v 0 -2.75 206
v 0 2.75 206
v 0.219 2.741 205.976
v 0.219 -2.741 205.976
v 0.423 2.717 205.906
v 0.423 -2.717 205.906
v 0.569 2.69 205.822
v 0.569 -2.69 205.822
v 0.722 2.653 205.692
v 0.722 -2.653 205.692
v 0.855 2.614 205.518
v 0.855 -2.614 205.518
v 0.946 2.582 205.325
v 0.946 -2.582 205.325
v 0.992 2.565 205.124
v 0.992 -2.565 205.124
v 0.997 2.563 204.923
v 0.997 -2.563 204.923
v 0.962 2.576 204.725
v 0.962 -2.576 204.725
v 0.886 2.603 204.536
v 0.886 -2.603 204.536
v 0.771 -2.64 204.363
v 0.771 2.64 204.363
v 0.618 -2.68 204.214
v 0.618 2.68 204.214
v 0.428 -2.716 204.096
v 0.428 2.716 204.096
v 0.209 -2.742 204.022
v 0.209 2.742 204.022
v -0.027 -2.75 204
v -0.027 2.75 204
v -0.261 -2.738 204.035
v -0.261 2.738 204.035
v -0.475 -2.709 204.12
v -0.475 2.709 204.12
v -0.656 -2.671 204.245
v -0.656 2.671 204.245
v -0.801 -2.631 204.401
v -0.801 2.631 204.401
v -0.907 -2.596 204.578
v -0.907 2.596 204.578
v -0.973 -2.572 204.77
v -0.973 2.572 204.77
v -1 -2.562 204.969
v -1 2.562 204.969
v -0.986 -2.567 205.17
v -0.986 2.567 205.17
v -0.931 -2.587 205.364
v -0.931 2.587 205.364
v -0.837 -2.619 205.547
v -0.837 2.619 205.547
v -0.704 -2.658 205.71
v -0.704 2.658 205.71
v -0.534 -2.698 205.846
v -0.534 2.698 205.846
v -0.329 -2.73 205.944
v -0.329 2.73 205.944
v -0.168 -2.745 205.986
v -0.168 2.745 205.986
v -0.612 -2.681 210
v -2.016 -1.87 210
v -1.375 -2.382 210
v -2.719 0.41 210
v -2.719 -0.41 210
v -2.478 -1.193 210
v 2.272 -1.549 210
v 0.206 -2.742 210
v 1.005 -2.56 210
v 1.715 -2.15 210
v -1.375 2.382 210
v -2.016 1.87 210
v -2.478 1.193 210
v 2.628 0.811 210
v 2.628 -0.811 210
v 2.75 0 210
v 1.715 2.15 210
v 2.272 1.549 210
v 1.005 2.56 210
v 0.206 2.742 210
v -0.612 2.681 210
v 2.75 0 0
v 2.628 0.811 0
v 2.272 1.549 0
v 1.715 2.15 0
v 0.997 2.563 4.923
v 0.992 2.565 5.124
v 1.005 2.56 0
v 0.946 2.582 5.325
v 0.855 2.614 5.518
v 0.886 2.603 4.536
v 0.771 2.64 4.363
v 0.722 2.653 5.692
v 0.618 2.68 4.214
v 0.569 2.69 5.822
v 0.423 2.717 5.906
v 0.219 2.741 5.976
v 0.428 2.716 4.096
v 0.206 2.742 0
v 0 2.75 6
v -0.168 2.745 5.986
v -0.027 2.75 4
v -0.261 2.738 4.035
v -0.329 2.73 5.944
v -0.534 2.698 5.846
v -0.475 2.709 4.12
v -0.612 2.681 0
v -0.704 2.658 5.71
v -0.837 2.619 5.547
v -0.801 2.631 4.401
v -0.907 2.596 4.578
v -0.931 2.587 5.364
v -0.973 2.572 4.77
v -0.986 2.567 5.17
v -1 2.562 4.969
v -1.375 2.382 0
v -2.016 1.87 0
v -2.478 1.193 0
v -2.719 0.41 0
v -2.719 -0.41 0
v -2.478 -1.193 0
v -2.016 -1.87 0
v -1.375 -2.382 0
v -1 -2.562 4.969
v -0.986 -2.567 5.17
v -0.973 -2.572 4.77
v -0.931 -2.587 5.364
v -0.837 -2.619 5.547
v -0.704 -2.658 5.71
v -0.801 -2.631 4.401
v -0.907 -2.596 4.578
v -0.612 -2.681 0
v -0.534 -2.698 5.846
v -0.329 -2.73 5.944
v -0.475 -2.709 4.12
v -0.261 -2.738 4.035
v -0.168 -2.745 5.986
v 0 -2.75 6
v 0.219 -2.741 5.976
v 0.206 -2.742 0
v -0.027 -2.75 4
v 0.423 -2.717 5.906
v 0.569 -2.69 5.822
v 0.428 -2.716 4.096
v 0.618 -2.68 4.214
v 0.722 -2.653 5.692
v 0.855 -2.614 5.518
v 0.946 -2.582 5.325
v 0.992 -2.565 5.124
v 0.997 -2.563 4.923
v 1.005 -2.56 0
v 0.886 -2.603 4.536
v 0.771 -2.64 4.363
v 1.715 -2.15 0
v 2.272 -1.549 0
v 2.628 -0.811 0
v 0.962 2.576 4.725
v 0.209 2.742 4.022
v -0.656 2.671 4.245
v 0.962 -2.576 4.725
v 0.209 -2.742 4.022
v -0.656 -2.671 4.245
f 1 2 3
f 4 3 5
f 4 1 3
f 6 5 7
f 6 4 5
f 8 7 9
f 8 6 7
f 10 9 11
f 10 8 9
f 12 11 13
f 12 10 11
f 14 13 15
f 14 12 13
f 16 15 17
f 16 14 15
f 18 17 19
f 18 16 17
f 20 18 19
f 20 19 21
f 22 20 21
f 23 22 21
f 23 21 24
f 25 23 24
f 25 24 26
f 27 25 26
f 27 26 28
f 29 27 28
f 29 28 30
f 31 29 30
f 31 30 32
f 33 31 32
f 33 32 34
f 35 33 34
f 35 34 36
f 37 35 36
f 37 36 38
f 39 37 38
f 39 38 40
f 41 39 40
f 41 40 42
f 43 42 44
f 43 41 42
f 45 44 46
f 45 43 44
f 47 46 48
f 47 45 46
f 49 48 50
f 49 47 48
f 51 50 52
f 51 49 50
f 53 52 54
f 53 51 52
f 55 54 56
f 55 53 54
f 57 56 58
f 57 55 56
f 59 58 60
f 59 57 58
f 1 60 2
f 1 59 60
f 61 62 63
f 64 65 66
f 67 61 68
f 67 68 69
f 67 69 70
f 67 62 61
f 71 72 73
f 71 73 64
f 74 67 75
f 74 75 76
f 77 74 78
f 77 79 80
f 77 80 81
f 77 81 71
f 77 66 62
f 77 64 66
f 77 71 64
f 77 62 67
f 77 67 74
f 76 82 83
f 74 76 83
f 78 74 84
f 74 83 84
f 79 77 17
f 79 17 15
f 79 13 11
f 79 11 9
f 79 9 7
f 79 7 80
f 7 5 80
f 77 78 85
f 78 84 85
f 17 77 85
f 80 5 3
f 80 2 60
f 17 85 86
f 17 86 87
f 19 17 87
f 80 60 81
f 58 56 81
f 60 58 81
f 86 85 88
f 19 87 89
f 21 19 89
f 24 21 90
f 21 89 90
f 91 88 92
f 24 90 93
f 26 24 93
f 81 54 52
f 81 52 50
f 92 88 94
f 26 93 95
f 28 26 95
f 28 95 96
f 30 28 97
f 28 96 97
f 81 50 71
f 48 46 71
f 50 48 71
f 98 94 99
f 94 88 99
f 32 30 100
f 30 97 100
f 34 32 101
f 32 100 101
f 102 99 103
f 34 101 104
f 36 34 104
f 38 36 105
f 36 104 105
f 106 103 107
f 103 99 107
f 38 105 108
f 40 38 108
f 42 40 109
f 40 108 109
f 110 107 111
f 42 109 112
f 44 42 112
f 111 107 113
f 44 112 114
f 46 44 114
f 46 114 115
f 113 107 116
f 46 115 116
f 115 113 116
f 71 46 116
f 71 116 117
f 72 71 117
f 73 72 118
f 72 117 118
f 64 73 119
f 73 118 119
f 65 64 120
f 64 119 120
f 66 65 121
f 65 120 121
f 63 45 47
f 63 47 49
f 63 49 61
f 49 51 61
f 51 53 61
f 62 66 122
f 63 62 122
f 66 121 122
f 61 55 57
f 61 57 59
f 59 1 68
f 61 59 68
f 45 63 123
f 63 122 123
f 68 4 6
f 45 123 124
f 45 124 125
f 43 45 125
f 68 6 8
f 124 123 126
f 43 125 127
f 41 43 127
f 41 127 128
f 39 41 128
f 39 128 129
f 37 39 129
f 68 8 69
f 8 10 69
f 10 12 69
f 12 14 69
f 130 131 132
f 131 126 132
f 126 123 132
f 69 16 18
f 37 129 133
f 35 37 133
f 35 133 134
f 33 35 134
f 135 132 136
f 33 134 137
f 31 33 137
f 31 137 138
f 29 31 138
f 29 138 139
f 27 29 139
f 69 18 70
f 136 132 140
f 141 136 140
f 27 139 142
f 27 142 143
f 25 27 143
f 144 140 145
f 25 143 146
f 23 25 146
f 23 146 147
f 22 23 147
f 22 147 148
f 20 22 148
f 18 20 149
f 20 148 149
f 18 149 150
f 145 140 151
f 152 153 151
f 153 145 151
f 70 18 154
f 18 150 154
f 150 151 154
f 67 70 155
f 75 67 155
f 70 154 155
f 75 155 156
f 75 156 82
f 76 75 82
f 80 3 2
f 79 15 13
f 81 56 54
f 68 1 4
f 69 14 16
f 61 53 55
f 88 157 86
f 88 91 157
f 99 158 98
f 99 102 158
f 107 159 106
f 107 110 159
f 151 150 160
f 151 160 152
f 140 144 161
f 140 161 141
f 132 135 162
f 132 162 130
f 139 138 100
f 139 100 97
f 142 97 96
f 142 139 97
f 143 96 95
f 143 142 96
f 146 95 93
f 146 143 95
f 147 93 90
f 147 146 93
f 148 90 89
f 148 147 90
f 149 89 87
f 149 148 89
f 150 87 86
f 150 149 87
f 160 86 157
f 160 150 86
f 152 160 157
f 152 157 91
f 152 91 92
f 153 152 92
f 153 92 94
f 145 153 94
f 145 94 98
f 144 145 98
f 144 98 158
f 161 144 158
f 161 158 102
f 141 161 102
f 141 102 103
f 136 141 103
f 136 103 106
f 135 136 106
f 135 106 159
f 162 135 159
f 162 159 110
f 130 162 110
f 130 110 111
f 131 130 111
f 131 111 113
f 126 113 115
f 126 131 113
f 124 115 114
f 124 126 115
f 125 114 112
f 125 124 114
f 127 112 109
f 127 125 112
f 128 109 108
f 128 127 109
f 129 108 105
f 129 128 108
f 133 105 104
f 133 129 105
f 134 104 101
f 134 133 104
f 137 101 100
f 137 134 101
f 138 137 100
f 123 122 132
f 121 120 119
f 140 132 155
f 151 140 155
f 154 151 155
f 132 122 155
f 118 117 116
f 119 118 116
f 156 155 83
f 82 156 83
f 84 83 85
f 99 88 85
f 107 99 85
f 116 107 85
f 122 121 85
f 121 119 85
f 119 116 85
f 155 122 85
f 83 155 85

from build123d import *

# Parameters (mm, degrees)
SKETCH1_R               = 2.75
BOSS_EXTRUDE1_DEPTH     = 210
CUT_EXTRUDE1_DEPTH      = 211.036008818
CUT_EXTRUDE1_DEPTH_BACK = 211.036008818
SKETCH2_R               = 1
CUT_EXTRUDE2_DEPTH      = 211.03600892
CUT_EXTRUDE2_DEPTH_BACK = 211.03600892
SKETCH3_R               = 1


with BuildPart() as part:
    # Sketch1 → Boss-Extrude1 (new body)
    with BuildSketch(Plane.XY):
        Circle(SKETCH1_R)
    extrude(amount=BOSS_EXTRUDE1_DEPTH)

    # Sketch2 → Cut-Extrude1 (cut, two sides: drawn at the far end of the back side and taken through both)
    with BuildSketch(Plane(origin=(0, 0, 0), x_dir=(1, 0, 0), z_dir=(0, 1, 0)).offset(-CUT_EXTRUDE1_DEPTH_BACK)):
        with Locations(Location((0, -5, 0), (0, 0, 270))):
            Circle(SKETCH2_R)
    extrude(amount=CUT_EXTRUDE1_DEPTH + CUT_EXTRUDE1_DEPTH_BACK, mode=Mode.SUBTRACT)

    # Sketch3 → Cut-Extrude2 (cut, two sides: drawn at the far end of the back side and taken through both)
    with BuildSketch(Plane(origin=(0, 0, 0), x_dir=(1, 0, 0), z_dir=(0, 1, 0)).offset(-CUT_EXTRUDE2_DEPTH_BACK)):
        with Locations(Location((0, -205, 0), (0, 0, 270))):
            Circle(SKETCH3_R)
    extrude(amount=CUT_EXTRUDE2_DEPTH + CUT_EXTRUDE2_DEPTH_BACK, mode=Mode.SUBTRACT)


solid = part.part
